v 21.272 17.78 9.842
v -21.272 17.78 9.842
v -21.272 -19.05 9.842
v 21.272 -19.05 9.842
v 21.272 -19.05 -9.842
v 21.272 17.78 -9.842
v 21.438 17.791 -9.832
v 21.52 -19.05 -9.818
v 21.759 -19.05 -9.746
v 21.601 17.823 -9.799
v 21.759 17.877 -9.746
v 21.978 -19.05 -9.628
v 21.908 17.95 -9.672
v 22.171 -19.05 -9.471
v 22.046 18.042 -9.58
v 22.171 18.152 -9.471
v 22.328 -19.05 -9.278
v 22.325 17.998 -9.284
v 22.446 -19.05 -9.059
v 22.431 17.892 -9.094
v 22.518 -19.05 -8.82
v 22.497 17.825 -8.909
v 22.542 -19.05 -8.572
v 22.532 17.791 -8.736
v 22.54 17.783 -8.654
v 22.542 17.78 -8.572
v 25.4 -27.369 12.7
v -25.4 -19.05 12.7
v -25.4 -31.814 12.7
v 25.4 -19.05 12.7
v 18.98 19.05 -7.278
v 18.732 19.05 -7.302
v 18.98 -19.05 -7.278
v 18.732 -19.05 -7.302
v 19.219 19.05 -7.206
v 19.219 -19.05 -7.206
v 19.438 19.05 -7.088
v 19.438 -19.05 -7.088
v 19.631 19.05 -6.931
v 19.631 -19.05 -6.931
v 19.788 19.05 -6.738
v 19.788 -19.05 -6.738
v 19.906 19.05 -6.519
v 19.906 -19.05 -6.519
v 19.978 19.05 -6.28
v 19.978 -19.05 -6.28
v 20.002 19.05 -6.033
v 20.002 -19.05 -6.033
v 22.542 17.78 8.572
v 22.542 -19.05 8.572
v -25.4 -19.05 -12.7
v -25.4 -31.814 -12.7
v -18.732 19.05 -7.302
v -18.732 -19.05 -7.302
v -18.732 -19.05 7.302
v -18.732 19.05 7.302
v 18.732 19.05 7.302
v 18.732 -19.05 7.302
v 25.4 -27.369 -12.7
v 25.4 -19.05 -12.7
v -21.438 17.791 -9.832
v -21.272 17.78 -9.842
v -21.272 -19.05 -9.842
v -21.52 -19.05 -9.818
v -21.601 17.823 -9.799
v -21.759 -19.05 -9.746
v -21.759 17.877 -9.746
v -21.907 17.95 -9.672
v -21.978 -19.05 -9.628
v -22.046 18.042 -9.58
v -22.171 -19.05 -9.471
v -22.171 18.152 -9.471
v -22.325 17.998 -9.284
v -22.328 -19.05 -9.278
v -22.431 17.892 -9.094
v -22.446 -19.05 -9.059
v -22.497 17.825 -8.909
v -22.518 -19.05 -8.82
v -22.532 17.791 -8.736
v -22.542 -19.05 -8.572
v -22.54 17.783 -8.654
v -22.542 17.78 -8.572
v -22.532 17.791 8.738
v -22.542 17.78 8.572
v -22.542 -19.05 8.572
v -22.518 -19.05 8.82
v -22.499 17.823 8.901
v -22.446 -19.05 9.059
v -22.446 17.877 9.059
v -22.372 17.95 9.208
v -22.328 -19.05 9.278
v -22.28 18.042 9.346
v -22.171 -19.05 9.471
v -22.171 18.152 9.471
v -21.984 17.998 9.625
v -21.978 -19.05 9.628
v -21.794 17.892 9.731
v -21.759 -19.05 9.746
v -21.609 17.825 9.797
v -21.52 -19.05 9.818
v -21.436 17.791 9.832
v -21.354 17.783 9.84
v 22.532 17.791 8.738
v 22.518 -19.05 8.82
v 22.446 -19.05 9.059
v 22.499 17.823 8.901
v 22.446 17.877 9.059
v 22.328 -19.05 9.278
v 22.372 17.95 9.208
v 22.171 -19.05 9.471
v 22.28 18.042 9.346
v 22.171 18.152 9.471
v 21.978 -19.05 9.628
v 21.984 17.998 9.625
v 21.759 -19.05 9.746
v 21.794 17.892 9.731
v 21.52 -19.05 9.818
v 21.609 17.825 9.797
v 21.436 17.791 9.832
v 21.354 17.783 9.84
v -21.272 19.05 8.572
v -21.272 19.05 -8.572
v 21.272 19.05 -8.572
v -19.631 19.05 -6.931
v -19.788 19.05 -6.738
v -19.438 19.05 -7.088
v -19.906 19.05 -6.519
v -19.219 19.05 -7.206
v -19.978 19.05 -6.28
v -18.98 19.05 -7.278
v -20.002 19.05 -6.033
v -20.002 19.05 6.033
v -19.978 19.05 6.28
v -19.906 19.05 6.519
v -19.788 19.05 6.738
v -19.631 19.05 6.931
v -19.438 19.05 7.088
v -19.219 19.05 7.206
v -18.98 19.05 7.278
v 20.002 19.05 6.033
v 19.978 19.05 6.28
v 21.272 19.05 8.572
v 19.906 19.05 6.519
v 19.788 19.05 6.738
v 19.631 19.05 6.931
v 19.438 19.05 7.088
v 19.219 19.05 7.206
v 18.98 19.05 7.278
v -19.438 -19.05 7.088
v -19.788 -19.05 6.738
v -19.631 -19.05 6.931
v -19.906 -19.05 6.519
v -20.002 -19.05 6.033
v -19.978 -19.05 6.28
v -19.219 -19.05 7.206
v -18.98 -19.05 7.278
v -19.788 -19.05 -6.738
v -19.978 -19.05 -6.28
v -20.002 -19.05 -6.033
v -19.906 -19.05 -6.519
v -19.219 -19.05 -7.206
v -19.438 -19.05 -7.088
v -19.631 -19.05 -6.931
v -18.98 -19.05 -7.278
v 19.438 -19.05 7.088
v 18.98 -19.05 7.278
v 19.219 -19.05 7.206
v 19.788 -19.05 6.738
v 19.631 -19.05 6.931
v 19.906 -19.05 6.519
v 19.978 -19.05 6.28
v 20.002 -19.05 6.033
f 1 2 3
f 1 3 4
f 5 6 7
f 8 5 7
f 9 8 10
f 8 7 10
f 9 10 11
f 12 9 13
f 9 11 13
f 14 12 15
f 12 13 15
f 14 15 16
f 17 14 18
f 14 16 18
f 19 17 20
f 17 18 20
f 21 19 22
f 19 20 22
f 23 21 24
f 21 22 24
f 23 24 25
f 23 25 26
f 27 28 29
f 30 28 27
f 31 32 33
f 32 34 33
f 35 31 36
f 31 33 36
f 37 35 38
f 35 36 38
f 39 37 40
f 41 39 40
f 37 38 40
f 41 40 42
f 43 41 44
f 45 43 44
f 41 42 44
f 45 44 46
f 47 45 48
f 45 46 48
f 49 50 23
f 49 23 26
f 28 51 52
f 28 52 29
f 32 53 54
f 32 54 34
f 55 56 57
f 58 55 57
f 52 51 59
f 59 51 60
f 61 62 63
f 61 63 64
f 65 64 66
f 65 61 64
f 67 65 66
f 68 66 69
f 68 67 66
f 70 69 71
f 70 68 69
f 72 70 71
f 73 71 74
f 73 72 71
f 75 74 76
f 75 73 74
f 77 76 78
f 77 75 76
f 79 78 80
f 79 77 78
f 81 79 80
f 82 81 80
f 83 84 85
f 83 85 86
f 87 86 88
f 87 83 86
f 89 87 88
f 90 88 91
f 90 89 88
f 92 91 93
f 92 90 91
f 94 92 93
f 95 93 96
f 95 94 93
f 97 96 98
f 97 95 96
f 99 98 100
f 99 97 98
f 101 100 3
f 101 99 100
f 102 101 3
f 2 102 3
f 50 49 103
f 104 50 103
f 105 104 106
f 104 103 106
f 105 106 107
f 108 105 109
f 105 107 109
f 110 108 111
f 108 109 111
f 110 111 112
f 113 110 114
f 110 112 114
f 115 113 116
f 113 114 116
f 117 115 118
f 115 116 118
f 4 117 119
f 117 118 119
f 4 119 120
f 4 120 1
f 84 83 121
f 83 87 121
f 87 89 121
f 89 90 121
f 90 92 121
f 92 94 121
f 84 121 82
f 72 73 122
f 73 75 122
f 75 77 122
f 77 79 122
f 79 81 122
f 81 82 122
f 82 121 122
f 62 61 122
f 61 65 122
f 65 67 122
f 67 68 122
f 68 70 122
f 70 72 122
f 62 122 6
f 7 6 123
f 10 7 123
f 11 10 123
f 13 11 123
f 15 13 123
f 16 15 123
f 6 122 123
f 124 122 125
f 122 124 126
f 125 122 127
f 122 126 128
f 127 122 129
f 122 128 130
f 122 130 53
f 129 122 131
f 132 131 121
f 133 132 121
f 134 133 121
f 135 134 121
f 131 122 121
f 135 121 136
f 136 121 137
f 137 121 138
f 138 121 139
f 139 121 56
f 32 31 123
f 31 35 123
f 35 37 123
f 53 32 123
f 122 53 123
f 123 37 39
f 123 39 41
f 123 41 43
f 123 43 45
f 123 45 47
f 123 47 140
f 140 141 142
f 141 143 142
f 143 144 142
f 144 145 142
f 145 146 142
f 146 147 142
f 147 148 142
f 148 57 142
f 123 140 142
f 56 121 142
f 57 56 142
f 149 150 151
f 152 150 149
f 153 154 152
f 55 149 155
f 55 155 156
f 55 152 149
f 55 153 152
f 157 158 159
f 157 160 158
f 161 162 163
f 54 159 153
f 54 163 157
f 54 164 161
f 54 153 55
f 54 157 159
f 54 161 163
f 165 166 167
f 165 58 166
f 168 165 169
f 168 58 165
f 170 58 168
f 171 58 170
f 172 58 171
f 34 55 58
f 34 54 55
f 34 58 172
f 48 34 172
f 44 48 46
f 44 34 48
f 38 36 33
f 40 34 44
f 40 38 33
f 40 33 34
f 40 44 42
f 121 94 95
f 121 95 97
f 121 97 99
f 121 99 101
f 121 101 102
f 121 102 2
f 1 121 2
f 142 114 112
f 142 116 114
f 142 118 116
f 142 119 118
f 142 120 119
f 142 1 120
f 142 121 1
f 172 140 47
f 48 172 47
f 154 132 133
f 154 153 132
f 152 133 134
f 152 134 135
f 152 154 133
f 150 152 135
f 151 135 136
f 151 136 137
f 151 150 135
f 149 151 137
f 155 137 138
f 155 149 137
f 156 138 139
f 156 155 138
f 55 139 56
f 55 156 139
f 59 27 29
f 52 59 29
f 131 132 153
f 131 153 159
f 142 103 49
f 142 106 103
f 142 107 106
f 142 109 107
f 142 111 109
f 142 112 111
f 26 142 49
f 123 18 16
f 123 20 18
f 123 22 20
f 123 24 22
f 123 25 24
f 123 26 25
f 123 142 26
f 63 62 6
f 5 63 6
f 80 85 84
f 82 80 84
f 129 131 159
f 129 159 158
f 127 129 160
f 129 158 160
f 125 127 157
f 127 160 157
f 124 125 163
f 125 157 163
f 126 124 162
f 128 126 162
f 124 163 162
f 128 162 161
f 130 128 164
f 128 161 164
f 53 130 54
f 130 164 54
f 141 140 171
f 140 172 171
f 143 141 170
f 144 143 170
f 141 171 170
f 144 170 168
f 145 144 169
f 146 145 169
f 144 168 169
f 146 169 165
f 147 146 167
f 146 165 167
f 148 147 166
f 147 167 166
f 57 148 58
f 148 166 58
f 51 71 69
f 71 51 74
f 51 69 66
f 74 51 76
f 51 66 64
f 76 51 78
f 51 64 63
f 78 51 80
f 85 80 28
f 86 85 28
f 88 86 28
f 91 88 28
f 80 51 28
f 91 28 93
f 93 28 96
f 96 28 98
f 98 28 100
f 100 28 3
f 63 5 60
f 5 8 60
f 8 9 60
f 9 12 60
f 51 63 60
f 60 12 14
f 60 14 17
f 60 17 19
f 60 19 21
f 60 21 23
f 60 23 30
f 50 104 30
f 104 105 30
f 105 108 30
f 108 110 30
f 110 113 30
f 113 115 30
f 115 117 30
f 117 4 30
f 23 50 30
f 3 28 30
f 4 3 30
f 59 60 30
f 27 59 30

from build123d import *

# Parameters (mm, degrees)
SKETCH1_W           = 45.085
SKETCH1_H           = 38.1
BOSS_EXTRUDE1_DEPTH = 9.8425
SKETCH2_W           = 50.8
SKETCH2_H           = 25.4
BOSS_EXTRUDE2_DEPTH = 12.7635
CUT_EXTRUDE1_DEPTH  = 26.4
SKETCH4_W           = 40.005
SKETCH4_H           = 14.605
CUT_EXTRUDE2_DEPTH  = 38.1
CHAMFER1_SIZE       = 1.27
FILLET1_R           = 1.27


with BuildPart() as part:
    # Sketch1 → Boss-Extrude1 (new body, symmetric)
    with BuildSketch(Plane.XY):
        Rectangle(SKETCH1_W, SKETCH1_H)
    extrude(amount=BOSS_EXTRUDE1_DEPTH, both=True)

    # Sketch2 → Boss-Extrude2 (add)
    with BuildSketch(Plane.XZ.offset(19.05)):
        Rectangle(SKETCH2_W, SKETCH2_H)
    extrude(amount=BOSS_EXTRUDE2_DEPTH)

    # Sketch3 → Cut-Extrude1 (cut, through all)
    with BuildSketch(Plane.XY.offset(12.7)):
        Polygon((25.4, -31.8135), (25.4, -27.369075893), (-25.4, -31.8135), align=None)
    extrude(amount=-CUT_EXTRUDE1_DEPTH, mode=Mode.SUBTRACT)

    # Sketch4 → Cut-Extrude2 (cut)
    with BuildSketch(Plane(origin=(0, 19.05, 0), x_dir=(1, 0, 0), z_dir=(0, 1, 0))):
        Rectangle(SKETCH4_W, SKETCH4_H)
    extrude(amount=-CUT_EXTRUDE2_DEPTH, mode=Mode.SUBTRACT)

    # Chamfer1
    chamfer1_edges = [part.edges().sort_by_distance(p)[0] for p in [
        (0, 19.05, -9.8425),
        (-22.5425, 19.05, 0),
        (22.5425, 19.05, 0),
        (0, 19.05, 9.8425),
    ]]
    chamfer(chamfer1_edges, length=CHAMFER1_SIZE)

    # Fillet1
    fillet1_edges = [part.edges().sort_by_distance(p)[0] for p in [
        (20.0025, 0, -7.3025),
        (20.0025, 0, 7.3025),
        (-20.0025, 0, 7.3025),
        (-20.0025, 0, -7.3025),
        (22.5425, -0.635, 9.8425),
        (-22.5425, -0.635, -9.8425),
        (-22.5425, -0.635, 9.8425),
        (22.5425, -0.635, -9.8425),
    ]]
    fillet(fillet1_edges, radius=FILLET1_R)


solid = part.part
